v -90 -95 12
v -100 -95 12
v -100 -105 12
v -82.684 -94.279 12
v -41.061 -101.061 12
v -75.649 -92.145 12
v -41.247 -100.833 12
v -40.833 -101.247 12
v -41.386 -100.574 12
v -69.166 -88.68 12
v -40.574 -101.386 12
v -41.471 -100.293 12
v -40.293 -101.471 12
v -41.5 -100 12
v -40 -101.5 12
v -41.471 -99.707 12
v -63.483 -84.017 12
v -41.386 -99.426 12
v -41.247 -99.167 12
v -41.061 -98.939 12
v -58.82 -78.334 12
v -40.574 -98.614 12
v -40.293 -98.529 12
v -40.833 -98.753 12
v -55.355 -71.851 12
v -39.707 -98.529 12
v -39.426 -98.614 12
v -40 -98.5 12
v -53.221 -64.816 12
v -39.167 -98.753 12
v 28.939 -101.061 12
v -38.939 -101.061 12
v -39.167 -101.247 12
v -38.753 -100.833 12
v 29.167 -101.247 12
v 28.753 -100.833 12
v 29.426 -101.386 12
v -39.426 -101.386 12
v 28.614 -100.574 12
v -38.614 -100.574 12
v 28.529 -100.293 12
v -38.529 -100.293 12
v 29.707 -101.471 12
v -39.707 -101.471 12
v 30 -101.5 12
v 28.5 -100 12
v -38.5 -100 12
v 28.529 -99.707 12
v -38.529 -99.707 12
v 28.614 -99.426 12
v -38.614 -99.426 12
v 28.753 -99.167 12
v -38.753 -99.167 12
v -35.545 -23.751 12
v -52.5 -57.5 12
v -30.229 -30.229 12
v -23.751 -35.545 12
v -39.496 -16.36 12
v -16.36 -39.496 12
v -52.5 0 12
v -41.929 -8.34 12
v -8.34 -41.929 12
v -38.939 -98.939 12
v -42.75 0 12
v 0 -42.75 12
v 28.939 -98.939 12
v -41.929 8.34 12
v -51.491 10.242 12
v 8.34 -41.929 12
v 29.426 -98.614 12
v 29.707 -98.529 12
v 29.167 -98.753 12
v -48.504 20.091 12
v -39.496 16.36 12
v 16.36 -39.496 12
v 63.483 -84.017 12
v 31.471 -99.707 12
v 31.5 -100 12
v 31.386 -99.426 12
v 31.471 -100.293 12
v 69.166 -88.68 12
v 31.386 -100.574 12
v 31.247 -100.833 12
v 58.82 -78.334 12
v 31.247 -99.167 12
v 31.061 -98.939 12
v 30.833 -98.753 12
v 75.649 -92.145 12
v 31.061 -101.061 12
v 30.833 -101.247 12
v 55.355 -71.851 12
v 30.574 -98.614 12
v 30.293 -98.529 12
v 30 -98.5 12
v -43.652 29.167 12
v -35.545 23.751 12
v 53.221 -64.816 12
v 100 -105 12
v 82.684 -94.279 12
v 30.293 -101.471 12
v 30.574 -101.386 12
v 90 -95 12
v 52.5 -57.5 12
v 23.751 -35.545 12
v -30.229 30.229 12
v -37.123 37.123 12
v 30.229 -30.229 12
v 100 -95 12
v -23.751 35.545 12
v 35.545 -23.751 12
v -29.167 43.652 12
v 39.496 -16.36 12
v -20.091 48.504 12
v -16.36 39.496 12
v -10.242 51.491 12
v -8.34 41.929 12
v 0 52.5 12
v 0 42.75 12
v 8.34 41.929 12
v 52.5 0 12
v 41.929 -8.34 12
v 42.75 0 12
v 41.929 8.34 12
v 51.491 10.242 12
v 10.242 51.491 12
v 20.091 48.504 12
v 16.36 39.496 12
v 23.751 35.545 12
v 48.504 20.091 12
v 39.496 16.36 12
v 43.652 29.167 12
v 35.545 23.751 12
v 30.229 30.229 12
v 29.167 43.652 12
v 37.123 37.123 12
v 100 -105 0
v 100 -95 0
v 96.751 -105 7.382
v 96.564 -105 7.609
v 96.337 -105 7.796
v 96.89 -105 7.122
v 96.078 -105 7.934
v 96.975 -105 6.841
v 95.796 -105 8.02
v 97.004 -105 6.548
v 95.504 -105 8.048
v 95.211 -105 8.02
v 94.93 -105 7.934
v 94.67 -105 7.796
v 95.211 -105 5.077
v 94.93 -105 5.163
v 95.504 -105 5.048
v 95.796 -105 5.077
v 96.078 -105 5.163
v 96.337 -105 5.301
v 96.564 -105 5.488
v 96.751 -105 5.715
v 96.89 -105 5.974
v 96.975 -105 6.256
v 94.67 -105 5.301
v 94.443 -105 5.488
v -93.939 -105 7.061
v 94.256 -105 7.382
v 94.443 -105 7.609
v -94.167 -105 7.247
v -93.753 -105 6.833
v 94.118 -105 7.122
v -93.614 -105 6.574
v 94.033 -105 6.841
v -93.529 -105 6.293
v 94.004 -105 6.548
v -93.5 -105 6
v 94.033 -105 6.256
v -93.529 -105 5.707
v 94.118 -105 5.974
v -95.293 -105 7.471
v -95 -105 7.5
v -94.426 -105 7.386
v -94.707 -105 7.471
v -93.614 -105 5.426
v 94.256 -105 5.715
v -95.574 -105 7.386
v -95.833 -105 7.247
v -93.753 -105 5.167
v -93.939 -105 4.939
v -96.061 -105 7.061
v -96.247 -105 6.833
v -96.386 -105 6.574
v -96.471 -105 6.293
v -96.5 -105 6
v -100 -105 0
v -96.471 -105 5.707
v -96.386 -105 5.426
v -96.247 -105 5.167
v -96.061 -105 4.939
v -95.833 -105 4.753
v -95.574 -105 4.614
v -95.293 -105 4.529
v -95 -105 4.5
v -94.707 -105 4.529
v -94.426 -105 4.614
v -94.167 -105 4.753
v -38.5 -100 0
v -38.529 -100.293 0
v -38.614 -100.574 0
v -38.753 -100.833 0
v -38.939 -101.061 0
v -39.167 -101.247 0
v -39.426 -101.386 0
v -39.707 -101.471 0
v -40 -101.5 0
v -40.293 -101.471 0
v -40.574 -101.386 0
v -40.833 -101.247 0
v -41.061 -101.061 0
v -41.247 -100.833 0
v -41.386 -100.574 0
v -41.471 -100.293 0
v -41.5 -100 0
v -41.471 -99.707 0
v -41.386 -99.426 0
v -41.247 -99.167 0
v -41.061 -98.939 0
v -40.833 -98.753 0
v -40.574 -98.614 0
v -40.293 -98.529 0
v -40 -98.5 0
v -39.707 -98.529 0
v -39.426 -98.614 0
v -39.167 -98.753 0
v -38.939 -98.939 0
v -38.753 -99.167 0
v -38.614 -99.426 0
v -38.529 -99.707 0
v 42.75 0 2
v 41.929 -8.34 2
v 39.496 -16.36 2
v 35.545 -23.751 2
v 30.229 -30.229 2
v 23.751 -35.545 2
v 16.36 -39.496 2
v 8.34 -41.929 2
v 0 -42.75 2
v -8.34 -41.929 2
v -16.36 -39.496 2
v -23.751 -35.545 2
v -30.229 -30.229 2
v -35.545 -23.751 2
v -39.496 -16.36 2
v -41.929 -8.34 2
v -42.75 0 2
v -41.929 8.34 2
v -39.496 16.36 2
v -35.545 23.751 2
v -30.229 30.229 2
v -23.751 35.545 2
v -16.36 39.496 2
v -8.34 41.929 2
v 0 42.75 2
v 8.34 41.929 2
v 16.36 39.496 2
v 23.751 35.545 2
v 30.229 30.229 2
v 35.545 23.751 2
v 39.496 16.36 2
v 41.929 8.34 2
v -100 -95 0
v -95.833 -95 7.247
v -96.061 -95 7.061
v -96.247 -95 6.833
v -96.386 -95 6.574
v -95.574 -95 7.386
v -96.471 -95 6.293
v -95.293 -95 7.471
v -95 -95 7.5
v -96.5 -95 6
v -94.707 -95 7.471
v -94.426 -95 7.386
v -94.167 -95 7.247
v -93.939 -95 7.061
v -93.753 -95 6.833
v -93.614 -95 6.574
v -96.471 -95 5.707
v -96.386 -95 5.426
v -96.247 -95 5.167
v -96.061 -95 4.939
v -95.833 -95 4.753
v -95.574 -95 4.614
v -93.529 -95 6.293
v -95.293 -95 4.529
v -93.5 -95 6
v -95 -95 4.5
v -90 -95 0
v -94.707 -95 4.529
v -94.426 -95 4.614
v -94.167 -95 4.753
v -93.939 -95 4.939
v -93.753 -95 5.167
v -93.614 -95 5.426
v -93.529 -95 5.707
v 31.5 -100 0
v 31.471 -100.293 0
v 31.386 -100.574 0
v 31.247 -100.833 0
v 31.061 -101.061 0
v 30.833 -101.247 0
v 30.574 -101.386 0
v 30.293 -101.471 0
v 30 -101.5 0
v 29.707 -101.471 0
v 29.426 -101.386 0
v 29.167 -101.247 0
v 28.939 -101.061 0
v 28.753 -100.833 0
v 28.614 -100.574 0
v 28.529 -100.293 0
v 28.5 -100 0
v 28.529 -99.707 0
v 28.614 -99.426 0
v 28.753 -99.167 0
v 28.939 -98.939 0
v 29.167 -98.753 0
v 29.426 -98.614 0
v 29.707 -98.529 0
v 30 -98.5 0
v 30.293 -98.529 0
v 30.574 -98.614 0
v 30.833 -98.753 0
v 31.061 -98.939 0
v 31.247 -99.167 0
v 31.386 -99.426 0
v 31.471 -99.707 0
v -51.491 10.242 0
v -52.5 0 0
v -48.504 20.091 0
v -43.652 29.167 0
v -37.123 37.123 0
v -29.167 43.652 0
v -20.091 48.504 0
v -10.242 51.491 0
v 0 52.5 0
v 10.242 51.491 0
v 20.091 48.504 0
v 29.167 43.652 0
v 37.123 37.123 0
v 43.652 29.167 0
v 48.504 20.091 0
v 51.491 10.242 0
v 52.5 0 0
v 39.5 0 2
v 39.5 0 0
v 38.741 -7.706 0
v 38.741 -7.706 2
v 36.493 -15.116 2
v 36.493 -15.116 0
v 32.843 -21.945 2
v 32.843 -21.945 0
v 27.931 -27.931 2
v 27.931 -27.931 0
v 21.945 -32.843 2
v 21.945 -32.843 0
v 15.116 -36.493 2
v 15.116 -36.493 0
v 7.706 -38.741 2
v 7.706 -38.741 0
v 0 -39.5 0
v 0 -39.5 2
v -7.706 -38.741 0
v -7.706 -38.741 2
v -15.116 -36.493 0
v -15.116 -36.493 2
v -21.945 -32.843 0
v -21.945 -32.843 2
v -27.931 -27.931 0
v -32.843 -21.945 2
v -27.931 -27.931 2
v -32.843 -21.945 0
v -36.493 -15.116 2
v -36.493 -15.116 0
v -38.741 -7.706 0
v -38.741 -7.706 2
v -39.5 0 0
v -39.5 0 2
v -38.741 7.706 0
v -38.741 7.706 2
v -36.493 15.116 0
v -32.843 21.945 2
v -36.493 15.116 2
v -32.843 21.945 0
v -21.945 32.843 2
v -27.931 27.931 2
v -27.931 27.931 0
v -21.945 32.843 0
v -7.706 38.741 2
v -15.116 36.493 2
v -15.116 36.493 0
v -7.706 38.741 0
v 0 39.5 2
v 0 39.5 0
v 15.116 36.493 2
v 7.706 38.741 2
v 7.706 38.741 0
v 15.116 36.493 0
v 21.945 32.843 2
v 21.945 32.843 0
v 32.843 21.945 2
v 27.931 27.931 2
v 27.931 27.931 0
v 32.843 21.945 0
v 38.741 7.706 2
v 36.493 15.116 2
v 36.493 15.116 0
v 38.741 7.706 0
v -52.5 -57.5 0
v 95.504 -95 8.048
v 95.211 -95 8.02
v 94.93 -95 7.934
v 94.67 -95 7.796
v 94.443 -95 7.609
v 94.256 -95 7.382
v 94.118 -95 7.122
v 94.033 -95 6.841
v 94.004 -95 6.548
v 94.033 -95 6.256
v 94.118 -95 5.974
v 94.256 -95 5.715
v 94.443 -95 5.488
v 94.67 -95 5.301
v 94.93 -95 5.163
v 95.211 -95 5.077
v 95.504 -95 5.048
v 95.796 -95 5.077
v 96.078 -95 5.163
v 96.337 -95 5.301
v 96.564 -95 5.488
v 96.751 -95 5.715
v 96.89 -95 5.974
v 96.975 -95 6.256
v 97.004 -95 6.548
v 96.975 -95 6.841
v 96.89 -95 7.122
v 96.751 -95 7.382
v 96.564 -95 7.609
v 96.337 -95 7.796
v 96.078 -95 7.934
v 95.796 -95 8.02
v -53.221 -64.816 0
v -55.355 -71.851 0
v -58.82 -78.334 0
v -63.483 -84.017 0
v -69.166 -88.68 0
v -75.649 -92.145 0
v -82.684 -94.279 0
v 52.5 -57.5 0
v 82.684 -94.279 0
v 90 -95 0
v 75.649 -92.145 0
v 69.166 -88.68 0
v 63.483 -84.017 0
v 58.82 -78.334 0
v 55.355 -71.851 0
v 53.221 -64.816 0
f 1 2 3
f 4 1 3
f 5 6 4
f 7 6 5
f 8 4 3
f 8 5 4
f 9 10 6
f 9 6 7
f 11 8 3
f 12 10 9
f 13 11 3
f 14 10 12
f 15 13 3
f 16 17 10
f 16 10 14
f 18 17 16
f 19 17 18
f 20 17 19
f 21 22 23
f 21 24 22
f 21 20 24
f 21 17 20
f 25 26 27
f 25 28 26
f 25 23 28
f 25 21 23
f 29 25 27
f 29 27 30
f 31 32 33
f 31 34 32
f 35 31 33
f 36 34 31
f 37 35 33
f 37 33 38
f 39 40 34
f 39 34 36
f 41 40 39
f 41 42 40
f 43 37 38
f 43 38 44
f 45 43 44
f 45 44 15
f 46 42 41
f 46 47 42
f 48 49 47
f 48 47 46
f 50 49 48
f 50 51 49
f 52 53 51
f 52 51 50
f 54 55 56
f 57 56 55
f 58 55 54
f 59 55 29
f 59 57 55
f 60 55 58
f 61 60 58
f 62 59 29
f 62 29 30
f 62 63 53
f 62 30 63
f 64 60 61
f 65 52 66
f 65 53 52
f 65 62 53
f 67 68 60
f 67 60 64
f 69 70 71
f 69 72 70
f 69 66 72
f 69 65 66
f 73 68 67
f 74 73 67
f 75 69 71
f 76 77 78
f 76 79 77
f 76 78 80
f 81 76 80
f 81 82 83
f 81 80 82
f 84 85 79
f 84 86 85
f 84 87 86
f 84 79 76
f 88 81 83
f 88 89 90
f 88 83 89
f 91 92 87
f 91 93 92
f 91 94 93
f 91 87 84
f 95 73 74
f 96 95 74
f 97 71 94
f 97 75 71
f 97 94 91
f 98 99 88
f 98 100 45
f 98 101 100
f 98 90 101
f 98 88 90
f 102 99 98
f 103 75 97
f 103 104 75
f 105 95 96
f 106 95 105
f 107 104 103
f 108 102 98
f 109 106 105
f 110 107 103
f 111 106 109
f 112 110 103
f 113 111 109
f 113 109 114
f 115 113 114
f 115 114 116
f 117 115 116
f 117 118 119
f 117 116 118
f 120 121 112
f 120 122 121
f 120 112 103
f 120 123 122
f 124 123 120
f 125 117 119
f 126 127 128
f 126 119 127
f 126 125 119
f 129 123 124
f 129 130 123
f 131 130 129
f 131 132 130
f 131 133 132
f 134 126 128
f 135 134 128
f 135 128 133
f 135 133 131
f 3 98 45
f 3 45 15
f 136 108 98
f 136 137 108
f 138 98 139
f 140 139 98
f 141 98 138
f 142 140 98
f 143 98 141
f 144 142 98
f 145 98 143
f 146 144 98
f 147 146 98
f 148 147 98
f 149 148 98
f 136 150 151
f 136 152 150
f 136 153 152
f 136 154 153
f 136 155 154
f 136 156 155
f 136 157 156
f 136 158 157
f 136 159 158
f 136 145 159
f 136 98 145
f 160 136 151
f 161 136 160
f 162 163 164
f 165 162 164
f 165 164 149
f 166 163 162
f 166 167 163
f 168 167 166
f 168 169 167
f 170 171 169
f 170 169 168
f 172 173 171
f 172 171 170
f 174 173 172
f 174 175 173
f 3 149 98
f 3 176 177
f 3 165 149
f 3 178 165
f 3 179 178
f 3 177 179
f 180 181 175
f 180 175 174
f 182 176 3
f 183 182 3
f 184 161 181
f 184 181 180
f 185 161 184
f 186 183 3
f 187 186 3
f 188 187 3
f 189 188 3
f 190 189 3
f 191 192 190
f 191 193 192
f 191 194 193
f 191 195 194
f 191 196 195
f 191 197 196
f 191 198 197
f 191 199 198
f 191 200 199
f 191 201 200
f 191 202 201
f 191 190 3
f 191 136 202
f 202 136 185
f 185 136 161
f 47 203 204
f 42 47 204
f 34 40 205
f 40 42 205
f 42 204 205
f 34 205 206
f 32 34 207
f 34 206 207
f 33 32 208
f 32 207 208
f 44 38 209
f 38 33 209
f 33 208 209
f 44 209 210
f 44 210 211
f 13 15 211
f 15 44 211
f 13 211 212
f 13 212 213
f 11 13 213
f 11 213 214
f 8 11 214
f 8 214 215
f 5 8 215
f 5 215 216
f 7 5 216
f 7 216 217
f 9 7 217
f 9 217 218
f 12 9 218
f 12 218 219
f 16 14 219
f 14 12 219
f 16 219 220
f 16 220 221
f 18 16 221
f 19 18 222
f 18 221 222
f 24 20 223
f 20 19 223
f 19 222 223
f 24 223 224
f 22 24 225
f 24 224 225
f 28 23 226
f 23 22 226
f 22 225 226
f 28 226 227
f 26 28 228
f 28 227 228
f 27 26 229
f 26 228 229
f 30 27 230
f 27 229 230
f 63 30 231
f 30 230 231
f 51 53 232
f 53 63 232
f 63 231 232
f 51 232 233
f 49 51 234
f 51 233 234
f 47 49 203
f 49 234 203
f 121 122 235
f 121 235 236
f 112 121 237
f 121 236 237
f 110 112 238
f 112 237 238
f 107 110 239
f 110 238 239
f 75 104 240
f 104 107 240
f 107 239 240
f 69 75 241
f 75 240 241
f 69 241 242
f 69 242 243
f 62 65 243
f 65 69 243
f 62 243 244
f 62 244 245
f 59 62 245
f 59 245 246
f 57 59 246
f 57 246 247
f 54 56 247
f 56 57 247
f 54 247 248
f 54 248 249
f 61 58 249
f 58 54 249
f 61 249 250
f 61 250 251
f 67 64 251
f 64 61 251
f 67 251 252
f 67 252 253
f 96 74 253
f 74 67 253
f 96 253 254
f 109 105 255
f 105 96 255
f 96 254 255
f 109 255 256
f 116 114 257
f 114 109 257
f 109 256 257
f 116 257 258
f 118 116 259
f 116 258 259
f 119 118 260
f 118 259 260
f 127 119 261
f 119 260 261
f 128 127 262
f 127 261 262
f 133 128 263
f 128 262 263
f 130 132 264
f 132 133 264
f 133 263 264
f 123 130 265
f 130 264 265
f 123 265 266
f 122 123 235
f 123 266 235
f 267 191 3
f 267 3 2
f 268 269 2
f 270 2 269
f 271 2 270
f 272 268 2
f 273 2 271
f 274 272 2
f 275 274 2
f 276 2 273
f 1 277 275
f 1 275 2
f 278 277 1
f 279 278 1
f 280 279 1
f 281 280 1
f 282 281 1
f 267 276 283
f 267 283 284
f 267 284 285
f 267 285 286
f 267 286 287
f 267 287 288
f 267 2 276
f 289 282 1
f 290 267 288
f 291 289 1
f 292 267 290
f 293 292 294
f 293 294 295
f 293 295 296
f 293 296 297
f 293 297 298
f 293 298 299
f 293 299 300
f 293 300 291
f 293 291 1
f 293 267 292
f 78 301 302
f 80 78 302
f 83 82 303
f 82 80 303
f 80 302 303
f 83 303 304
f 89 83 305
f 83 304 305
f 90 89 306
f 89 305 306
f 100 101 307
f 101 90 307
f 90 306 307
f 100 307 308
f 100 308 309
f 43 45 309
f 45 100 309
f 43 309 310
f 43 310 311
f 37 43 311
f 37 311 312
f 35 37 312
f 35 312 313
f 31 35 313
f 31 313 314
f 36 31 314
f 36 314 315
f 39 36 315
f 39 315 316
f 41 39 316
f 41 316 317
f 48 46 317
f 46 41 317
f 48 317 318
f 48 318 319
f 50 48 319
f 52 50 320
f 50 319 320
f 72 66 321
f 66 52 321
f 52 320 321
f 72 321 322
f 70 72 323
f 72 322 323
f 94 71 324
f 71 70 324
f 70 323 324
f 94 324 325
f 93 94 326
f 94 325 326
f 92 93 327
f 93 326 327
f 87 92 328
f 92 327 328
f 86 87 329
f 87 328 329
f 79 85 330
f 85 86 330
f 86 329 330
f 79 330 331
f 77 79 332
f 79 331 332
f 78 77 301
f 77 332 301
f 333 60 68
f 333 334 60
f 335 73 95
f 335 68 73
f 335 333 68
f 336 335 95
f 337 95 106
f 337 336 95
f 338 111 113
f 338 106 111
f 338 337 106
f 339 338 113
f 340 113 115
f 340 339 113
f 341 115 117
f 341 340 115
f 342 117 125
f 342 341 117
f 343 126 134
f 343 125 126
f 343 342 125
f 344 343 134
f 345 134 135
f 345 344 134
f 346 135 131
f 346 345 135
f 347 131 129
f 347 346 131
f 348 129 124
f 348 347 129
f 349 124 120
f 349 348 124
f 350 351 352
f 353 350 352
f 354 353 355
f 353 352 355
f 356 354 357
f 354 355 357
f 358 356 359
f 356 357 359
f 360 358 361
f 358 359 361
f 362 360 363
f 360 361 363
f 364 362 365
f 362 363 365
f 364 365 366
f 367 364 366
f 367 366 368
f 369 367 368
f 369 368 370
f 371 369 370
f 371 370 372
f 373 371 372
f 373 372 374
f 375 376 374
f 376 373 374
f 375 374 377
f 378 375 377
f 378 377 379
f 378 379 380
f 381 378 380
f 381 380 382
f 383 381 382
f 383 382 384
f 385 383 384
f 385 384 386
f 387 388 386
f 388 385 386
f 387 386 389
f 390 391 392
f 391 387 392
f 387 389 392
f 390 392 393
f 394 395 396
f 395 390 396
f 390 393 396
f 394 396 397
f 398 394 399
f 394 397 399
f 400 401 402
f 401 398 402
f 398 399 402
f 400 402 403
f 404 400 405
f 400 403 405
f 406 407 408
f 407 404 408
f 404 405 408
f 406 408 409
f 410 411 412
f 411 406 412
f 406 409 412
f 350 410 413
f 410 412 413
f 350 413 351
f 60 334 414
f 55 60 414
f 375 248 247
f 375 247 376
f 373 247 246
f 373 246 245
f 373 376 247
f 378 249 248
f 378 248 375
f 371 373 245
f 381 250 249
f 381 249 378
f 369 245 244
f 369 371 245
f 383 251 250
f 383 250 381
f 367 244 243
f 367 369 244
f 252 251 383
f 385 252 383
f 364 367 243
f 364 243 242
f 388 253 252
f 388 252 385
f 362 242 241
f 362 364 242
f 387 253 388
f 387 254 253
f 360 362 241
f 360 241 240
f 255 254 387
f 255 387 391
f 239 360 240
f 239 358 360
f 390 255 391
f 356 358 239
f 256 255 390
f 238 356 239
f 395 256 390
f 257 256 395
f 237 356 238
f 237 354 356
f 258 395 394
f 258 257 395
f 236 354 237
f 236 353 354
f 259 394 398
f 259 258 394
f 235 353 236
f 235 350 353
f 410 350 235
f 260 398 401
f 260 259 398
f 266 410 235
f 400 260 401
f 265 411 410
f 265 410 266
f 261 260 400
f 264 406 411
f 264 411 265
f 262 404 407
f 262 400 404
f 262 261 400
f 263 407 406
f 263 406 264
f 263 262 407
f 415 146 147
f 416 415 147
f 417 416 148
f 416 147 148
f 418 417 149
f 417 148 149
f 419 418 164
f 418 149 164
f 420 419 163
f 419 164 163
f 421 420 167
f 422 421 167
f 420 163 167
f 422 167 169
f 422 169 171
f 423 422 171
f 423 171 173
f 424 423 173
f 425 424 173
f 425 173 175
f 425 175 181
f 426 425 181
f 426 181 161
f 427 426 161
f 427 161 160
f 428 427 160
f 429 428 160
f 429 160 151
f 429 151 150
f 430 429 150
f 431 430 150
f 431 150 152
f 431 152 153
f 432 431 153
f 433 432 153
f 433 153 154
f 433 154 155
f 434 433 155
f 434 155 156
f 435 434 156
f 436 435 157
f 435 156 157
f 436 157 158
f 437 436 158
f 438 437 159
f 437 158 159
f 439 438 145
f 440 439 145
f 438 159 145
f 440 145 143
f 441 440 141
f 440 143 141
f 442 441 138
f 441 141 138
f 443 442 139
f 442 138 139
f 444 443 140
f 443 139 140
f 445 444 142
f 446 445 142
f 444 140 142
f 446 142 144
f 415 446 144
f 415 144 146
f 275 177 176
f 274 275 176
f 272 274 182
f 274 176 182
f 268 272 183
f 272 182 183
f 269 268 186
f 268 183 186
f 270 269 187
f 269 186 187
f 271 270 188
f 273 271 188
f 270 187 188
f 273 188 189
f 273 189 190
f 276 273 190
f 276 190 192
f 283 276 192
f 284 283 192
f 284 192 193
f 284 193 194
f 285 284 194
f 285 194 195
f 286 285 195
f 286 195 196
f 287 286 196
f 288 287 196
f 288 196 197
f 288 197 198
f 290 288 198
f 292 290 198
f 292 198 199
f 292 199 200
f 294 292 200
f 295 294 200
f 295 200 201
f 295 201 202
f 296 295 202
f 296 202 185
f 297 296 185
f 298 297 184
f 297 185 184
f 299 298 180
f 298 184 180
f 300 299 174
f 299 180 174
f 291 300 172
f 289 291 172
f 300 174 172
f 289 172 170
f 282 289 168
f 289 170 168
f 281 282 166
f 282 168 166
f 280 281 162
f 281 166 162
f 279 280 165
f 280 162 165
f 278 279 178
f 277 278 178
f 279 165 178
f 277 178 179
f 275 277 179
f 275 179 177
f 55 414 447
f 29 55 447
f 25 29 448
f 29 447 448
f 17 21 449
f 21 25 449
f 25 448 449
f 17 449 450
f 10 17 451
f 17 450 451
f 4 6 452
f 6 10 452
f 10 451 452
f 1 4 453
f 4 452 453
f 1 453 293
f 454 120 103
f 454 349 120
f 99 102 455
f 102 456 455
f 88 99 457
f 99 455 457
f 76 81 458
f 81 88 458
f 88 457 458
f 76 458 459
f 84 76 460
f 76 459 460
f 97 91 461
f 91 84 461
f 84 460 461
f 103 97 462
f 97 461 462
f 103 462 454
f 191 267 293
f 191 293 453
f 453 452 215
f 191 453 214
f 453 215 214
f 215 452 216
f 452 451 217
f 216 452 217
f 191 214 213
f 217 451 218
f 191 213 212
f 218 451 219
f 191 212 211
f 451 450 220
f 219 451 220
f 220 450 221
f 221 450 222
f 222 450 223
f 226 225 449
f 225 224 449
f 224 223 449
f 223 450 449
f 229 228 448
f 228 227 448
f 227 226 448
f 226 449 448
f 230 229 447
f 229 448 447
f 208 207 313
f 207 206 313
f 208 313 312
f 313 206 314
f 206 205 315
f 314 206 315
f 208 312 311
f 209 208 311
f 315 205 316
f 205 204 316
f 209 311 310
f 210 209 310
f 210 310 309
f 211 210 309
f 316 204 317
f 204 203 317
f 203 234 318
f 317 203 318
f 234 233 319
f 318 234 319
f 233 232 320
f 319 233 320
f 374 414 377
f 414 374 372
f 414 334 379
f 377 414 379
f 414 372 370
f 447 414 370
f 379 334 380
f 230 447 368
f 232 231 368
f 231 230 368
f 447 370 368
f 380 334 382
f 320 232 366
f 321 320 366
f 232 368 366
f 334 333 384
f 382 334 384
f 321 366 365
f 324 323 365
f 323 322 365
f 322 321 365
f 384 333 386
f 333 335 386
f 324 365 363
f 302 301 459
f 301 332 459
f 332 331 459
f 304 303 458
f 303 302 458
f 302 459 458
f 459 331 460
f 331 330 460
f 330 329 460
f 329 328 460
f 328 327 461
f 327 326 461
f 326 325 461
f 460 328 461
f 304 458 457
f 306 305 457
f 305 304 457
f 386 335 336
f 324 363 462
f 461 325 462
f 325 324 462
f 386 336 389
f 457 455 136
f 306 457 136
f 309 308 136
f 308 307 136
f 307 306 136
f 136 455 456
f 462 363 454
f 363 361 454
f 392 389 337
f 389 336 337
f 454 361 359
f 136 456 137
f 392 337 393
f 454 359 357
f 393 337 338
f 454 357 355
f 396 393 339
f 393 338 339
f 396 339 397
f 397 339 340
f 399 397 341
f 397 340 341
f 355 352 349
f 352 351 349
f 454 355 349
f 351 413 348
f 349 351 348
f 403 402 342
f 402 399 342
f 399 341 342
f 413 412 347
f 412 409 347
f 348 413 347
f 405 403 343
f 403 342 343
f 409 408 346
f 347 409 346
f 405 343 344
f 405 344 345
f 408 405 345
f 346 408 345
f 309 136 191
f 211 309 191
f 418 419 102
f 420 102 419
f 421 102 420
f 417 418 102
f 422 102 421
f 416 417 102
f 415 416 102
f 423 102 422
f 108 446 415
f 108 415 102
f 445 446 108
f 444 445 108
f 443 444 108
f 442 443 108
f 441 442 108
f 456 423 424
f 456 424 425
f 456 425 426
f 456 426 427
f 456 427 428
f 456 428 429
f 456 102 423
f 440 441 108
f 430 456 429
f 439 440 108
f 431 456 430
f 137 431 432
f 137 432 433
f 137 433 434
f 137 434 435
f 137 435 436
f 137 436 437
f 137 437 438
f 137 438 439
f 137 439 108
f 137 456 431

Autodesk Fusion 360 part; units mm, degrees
sketch "Sketch1" plane through (0, 0, 0) normal (0, 0, 1) x (1, 0, 0)
  circle A0 centre (0, 0) radius 42.75
  circle A1 centre (0, 0) radius 39.5
  line L0 (0, 0) -> (0, -100) construction
  line L1 (100, -105) -> (-100, -105)
  line L2 (-100, -105) -> (-100, -95)
  line L3 (100, -95) -> (100, -105)
  line L4 (100, -105) -> (-100, -95) construction
  line L5 (-100, -105) -> (100, -95) construction
  circle A2 centre (0, 0) radius 52.5
  line L6 (-52.5, 0) -> (-52.5, -57.5)
  line L7 (52.5, 0) -> (52.5, -57.5)
  line L8 (-100, -95) -> (-90, -95)
  line L9 (90, -95) -> (100, -95)
  arc A3 (-90, -95) -> (-52.5, -57.5) centre (-90, -57.5) ccw
  arc A4 (52.5, -57.5) -> (90, -95) centre (90, -57.5) ccw
  line L10 (100, -100) -> (30, -100) construction
  line L11 (100, -100) -> (-40, -100) construction
  circle A5 centre (30, -100) radius 1.5
  circle A6 centre (-40, -100) radius 1.5
  point P0 (0, -100)
  dimension "d1" = 85.5
  dimension "d5" = 79
  dimension "d7" = 100
  dimension "d8" = 200
  dimension "d9" = 10
  dimension "d10" = 105
  dimension "d11" = 37.5
  dimension "d12" = 10
  dimension "d13" = 37.5
  dimension "d24" = 70
  dimension "d25" = 140
  dimension "d26" = 3
  dimension "d27" = 3
extrude "Extrude1" add sketch "Sketch1" along normal blind 12 contours L1 L2 L3 A2 L6 L7 L8 L9 A3 A4 | A2
extrude "Extrude2" add sketch "Sketch1" along normal blind 2 contours A0
hole "Hole1" at (-95, -95, 6) direction (0, -1, 0) diameter 3 depth 10 tip angle 118
hole "Hole2" at (95.5037, -95, 6.5484) direction (0, -1, 0) diameter 3 depth 10 tip angle 118
equation "d1 = BearingDia + Tollerance"
equation "BearingDia = 85 mm"
equation "BearingOffset = 79 mm"
equation "Tollerance = 0.5 mm"
equation "d5 = BearingOffset"
equation "AxleHeight = 105 mm"
equation "d7 = AxleHeight - 5 mm"
equation "d10 = BearingDia + 20 mm"
equation "d24 = ( 210 / 3 ) * 1 mm"
